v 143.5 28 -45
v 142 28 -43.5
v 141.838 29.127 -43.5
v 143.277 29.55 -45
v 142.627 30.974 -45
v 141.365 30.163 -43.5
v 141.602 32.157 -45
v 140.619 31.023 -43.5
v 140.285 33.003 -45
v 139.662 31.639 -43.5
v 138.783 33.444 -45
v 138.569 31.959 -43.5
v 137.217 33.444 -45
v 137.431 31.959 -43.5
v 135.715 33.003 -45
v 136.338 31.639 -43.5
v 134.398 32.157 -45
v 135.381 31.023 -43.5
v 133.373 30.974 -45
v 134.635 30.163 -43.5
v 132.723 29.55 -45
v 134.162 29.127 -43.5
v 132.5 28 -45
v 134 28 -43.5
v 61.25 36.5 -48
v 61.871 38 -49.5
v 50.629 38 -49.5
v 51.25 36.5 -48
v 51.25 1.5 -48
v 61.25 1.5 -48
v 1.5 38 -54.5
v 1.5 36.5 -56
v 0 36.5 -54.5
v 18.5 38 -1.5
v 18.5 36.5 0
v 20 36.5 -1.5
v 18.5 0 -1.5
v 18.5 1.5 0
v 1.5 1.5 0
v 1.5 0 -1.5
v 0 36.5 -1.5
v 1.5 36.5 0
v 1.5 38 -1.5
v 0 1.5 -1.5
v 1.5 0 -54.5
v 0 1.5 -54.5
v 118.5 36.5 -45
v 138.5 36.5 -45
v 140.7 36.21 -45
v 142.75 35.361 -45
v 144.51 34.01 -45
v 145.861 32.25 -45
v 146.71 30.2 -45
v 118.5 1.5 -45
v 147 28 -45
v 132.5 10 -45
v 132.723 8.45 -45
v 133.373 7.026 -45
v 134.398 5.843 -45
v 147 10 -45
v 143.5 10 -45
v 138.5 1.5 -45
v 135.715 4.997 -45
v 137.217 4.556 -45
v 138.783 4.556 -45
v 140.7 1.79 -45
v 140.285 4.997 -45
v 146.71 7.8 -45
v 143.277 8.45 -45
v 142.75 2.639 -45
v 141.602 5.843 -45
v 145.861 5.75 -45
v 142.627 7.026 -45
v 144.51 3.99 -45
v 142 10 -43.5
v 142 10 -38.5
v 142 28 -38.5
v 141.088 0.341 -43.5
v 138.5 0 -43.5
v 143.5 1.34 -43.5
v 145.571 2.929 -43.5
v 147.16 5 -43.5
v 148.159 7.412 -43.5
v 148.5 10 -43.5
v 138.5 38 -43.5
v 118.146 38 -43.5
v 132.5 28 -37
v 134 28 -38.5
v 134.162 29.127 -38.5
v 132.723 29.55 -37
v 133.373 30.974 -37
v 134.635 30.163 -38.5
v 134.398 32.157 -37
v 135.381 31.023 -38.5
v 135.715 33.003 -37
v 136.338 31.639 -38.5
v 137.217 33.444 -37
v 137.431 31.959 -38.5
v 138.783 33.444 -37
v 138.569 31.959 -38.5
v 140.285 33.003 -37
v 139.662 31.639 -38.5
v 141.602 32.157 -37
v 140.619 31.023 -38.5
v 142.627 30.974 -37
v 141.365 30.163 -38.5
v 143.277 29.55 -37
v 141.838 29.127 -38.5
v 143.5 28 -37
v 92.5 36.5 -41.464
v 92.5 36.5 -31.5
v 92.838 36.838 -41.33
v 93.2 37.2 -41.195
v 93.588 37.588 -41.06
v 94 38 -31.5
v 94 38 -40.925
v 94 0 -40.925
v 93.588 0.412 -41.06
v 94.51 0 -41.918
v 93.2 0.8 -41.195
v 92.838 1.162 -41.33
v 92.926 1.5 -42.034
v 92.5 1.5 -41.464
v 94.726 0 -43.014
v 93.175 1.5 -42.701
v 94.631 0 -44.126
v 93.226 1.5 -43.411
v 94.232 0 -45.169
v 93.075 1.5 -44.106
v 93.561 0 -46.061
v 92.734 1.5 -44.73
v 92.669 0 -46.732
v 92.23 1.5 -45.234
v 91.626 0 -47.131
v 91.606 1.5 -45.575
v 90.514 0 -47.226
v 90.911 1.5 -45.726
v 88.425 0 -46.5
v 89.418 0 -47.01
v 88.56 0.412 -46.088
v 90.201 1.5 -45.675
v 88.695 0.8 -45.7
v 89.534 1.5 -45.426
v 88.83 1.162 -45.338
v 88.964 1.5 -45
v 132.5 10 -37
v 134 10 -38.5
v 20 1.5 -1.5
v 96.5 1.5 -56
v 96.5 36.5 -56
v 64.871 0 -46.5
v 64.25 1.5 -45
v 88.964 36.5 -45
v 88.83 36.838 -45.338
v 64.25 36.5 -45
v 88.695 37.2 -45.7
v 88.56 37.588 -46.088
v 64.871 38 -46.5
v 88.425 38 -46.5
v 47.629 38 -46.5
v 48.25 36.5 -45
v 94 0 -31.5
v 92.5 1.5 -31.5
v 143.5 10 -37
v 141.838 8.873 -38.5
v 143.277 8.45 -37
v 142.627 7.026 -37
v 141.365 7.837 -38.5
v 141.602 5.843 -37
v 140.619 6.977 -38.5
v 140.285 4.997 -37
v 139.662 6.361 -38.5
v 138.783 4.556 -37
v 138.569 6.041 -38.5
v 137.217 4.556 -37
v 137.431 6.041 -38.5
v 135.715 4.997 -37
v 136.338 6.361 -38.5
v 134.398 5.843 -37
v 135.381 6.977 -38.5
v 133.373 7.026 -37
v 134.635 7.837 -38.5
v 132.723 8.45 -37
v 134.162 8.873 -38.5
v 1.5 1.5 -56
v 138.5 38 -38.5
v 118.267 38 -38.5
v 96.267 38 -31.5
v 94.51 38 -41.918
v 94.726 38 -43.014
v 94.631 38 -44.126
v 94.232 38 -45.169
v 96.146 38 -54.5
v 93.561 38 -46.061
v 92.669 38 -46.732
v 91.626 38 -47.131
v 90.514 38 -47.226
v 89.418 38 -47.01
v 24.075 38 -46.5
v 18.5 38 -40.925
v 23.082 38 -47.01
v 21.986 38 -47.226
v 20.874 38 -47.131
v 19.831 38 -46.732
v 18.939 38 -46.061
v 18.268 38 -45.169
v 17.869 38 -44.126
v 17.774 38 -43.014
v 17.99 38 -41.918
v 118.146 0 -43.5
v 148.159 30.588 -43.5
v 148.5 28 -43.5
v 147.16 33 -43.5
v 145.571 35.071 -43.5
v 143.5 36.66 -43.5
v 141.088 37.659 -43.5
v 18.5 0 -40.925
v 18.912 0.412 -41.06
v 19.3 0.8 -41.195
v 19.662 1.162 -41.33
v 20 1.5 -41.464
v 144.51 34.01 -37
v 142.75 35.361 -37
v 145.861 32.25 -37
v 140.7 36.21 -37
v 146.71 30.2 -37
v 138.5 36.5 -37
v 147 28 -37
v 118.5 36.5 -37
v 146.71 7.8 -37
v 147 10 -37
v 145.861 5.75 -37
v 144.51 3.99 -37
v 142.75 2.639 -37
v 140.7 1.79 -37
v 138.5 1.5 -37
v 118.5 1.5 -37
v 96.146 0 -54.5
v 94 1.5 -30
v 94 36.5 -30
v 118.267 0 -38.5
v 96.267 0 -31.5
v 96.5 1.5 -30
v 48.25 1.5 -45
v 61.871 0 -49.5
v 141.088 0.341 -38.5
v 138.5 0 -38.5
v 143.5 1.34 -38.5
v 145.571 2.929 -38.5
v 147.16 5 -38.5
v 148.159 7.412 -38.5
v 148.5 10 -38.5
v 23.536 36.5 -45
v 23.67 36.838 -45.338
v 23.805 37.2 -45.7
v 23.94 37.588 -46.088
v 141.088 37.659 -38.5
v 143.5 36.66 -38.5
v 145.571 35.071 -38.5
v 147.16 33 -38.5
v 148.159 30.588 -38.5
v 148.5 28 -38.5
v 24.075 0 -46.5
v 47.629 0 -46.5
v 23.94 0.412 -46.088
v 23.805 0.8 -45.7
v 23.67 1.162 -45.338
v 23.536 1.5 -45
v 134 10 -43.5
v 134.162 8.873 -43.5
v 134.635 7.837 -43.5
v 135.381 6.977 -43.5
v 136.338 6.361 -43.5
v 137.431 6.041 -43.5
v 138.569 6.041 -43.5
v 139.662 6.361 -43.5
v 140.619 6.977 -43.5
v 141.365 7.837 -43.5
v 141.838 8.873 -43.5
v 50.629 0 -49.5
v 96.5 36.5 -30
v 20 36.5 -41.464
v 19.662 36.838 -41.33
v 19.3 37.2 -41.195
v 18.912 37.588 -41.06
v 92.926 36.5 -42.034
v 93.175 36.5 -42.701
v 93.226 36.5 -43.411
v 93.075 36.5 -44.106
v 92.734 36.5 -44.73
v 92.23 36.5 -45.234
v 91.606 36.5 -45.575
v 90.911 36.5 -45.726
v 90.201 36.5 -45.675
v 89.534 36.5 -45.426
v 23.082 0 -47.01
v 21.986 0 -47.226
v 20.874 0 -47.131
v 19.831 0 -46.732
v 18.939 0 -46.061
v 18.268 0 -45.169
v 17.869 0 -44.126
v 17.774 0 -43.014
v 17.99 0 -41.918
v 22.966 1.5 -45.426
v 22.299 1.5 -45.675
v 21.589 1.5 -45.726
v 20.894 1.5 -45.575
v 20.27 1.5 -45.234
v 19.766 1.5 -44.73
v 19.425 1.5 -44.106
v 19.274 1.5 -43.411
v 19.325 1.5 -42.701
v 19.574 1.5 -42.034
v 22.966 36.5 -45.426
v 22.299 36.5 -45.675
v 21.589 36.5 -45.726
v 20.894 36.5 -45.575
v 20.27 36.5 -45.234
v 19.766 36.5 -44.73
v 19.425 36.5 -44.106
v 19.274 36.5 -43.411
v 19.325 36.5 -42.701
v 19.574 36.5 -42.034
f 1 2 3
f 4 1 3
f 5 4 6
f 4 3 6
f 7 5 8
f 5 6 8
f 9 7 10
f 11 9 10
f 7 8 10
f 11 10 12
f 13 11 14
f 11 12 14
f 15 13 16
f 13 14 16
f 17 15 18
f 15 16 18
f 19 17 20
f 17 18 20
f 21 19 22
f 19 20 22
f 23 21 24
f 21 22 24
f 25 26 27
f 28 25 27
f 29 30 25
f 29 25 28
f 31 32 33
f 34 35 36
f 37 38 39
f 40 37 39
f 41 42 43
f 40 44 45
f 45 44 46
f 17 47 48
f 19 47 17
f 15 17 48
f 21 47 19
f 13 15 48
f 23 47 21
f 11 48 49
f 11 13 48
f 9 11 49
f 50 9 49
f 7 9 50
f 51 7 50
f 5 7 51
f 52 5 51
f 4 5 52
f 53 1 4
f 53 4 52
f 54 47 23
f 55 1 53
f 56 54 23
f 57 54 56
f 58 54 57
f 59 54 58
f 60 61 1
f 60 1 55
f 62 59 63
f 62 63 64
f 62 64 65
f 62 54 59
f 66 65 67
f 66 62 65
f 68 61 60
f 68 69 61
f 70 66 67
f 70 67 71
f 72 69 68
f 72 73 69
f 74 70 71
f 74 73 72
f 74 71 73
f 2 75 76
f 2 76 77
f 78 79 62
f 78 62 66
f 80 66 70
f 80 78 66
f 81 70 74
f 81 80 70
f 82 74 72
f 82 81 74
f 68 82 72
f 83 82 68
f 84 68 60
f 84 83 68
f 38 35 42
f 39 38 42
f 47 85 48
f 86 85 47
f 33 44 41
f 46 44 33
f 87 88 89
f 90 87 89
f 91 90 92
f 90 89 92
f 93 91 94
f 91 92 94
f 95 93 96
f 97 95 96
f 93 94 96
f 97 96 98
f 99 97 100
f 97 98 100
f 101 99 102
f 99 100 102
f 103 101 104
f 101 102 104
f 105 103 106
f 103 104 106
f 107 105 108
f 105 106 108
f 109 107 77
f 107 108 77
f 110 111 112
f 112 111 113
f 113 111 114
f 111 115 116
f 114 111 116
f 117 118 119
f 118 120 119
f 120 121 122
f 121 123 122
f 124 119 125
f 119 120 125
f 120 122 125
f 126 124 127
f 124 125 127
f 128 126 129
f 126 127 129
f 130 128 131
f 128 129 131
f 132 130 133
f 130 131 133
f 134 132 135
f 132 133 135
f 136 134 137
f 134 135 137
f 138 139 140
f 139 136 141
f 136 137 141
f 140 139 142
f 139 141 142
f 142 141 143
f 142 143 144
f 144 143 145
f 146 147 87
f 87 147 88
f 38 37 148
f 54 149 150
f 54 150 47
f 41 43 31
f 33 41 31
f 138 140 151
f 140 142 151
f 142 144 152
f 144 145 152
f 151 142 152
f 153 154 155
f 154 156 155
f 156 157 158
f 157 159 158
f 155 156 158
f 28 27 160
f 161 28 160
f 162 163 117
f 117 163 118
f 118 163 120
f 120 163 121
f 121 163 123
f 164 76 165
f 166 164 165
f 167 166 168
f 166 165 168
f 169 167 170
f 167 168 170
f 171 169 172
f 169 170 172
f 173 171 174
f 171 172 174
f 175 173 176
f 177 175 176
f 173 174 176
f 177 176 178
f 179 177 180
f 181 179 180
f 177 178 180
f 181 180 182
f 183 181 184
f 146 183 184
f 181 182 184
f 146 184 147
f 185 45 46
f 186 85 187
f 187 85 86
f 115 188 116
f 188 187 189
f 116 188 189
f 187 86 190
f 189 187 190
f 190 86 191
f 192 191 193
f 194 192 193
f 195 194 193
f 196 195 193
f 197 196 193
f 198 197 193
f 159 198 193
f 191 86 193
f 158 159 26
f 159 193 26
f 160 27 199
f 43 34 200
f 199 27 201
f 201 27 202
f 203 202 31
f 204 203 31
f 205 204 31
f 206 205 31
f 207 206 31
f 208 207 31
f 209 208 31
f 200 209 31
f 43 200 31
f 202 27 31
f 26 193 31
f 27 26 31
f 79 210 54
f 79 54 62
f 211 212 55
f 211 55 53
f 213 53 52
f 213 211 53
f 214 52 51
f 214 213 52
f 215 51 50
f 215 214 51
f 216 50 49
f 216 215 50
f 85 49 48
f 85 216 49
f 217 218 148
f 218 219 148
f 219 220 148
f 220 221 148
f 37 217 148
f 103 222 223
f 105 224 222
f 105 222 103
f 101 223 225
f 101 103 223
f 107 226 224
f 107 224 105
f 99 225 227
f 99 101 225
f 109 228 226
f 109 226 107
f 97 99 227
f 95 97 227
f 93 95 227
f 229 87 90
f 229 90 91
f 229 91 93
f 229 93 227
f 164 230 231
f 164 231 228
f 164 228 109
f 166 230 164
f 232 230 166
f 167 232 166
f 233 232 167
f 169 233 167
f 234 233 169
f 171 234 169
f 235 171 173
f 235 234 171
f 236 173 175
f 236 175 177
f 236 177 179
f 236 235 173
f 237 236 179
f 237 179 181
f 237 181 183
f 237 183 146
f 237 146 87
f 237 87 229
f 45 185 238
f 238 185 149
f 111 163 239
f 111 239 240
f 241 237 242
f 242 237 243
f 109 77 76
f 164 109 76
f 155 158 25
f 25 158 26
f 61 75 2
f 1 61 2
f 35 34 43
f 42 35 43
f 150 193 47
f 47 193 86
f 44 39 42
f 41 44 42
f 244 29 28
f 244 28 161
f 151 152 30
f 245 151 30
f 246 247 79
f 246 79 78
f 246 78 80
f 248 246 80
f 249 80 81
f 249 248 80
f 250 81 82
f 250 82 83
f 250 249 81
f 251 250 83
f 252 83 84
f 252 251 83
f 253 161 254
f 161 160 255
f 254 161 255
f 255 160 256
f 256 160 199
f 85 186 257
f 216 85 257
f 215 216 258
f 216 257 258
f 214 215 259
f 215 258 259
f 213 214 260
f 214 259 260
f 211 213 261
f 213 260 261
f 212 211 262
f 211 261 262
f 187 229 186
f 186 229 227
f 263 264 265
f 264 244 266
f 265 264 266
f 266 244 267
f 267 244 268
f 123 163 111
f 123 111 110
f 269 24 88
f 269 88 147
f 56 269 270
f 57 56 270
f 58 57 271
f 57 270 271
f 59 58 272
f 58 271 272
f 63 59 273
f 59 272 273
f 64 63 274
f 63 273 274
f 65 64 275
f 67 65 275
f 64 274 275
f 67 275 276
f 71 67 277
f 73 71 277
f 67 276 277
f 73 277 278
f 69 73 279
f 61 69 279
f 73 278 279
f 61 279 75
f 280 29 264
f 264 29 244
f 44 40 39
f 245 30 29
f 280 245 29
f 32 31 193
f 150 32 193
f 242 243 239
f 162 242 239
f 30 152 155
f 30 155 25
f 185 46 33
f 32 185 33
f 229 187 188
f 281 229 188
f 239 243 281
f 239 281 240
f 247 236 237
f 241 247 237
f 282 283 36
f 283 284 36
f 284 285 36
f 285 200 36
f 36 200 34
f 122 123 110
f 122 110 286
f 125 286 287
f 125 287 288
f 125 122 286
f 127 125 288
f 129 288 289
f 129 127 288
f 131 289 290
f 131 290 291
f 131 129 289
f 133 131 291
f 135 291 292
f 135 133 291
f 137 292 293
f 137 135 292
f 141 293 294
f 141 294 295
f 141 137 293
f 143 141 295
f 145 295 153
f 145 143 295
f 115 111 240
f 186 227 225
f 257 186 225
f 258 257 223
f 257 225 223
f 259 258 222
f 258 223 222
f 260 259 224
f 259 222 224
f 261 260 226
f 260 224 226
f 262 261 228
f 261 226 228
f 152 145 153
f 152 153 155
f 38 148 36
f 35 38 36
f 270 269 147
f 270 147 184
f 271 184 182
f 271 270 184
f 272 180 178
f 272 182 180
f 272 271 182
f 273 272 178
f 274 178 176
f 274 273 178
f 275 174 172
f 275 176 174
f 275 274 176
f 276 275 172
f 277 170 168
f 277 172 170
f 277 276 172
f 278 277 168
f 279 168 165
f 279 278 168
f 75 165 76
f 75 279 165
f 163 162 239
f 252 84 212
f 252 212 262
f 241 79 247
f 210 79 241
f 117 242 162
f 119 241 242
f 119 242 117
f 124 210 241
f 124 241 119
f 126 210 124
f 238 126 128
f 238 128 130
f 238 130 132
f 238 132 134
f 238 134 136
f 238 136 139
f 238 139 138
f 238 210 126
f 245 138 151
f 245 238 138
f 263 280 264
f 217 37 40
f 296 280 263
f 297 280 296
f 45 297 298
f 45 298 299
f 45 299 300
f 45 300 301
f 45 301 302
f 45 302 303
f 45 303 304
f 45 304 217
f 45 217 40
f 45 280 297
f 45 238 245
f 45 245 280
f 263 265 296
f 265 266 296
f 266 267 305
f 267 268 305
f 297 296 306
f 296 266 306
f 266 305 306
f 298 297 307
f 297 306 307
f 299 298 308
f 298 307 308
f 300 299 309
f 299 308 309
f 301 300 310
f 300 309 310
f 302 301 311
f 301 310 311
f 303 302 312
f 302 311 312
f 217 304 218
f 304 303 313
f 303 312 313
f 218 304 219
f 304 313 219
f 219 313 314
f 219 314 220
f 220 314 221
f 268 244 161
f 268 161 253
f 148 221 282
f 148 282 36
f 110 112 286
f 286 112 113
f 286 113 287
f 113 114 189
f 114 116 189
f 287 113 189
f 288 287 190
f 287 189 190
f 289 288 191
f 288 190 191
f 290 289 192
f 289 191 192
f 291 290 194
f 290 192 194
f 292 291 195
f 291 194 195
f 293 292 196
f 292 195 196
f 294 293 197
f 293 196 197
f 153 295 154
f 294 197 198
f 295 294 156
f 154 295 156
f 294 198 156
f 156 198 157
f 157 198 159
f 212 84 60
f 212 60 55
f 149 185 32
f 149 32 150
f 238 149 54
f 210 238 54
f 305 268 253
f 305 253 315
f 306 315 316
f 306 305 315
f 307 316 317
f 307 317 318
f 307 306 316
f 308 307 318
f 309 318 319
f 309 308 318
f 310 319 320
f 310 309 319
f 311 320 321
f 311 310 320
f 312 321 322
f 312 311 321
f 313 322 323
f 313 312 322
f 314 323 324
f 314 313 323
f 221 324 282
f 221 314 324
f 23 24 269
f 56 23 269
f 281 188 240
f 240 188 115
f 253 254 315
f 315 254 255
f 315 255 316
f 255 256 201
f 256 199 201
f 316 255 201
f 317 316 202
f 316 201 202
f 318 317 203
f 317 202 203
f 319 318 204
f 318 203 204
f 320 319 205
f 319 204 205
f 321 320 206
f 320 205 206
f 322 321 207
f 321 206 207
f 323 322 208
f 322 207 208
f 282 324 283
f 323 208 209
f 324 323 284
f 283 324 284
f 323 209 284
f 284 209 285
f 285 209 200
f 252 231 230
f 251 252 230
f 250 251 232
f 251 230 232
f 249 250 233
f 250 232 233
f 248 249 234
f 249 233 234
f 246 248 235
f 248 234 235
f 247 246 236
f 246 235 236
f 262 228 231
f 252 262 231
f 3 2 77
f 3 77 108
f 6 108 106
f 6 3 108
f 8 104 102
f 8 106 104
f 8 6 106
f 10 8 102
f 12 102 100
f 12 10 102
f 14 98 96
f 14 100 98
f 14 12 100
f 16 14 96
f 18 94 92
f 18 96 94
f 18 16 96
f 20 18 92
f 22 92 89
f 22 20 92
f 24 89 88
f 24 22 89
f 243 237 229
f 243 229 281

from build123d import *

# Parameters (mm, degrees)
CREATE_PROFILE_DEPTH     = 38
CUT_SHACKLE_HOLE_DEPTH   = 160.753716702
ROUND_EDGES_R            = 10
UNECESSARY_CHAMFERS_SIZE = 1.5


with BuildPart() as part:
    # Sketch1 → Create profile (new body)
    with BuildSketch(Plane(origin=(0, 0, 0), x_dir=(1, 0, 0), z_dir=(0, 1, 0))):
        with BuildLine():
            Line((0, 0), (0, 56))
            Line((0, 56), (96.5, 56))
            Line((96.5, 56), (118.5, 45))
            Line((118.5, 45), (148.5, 45))
            Line((148.5, 45), (148.5, 37))
            Line((148.5, 37), (118.5, 37))
            Line((118.5, 37), (96.5, 30))
            Line((96.5, 30), (92.5, 30))
            Line((92.5, 30), (92.5, 41.464466094))
            ThreePointArc((92.5, 41.464466094), (92.5, 45), (88.964466094, 45))
            Line((88.964466094, 45), (64.25, 45))
            Line((64.25, 45), (61.25, 48))
            Line((61.25, 48), (51.25, 48))
            Line((51.25, 48), (48.25, 45))
            Line((48.25, 45), (23.535533906, 45))
            ThreePointArc((23.535533906, 45), (20, 45), (20, 41.464466094))
            Line((20, 41.464466094), (20, 0))
            Line((20, 0), (0, 0))
        make_face()
    extrude(amount=CREATE_PROFILE_DEPTH)

    # Sketch3 → Cut shackle hole (cut, through all)
    with BuildSketch(Plane(origin=(0, 0, -45), x_dir=(-1, 0, 0), z_dir=(0, 0, -1))):
        with BuildLine():
            Line((-134, 28), (-134, 10))
            ThreePointArc((-134, 10), (-138, 6), (-142, 10))
            Line((-142, 10), (-142, 28))
            ThreePointArc((-142, 28), (-138, 32), (-134, 28))
        make_face()
    extrude(amount=-CUT_SHACKLE_HOLE_DEPTH, mode=Mode.SUBTRACT)

    # Round Edges
    round_edges_edges = [part.edges().sort_by_distance(p)[0] for p in [
        (148.5, 0, -41),
        (148.5, 38, -41),
    ]]
    fillet(round_edges_edges, radius=ROUND_EDGES_R)

    # Unecessary chamfers
    unecessary_chamfers_edges = [part.edges().sort_by_distance(p)[0] for p in [
        (20, 38, -45),
        (35.892766953, 38, -45),
        (0, 0, -28),
        (48.25, 0, -56),
        (107.5, 0, -50.5),
        (128.5, 0, -37),
        (107.5, 0, -33.5),
        (94.5, 0, -30),
        (92.5, 0, -35.732233047),
        (49.75, 38, -46.5),
        (92.5, 0, -45),
        (76.607233047, 0, -45),
        (62.75, 0, -46.5),
        (56.25, 0, -48),
        (49.75, 0, -46.5),
        (35.892766953, 0, -45),
        (20, 0, -45),
        (20, 0, -20.732233047),
        (10, 0, 0),
        (56.25, 38, -48),
        (62.75, 38, -46.5),
        (0, 19, 0),
        (0, 19, -56),
        (92.5, 19, -30),
        (20, 19, 0),
        (76.607233047, 38, -45),
        (92.5, 38, -45),
        (92.5, 38, -35.732233047),
        (94.5, 38, -30),
        (107.5, 38, -33.5),
        (10, 38, 0),
        (128.5, 38, -37),
        (138, 32, -37),
        (134, 19, -37),
        (138, 6, -37),
        (142, 19, -37),
        (138, 32, -45),
        (142, 19, -45),
        (138, 6, -45),
        (134, 19, -45),
        (107.5, 38, -50.5),
        (48.25, 38, -56),
        (0, 38, -28),
        (148.5, 19, -45),
        (148.5, 19, -37),
        (128.5, 0, -45),
        (128.5, 38, -45),
        (145.571067812, 35.071067812, -45),
        (145.571067812, 2.928932188, -45),
        (145.571067812, 35.071067812, -37),
        (145.571067812, 2.928932188, -37),
        (20, 38, -20.732233047),
    ]]
    chamfer(unecessary_chamfers_edges, length=UNECESSARY_CHAMFERS_SIZE)


solid = part.part
